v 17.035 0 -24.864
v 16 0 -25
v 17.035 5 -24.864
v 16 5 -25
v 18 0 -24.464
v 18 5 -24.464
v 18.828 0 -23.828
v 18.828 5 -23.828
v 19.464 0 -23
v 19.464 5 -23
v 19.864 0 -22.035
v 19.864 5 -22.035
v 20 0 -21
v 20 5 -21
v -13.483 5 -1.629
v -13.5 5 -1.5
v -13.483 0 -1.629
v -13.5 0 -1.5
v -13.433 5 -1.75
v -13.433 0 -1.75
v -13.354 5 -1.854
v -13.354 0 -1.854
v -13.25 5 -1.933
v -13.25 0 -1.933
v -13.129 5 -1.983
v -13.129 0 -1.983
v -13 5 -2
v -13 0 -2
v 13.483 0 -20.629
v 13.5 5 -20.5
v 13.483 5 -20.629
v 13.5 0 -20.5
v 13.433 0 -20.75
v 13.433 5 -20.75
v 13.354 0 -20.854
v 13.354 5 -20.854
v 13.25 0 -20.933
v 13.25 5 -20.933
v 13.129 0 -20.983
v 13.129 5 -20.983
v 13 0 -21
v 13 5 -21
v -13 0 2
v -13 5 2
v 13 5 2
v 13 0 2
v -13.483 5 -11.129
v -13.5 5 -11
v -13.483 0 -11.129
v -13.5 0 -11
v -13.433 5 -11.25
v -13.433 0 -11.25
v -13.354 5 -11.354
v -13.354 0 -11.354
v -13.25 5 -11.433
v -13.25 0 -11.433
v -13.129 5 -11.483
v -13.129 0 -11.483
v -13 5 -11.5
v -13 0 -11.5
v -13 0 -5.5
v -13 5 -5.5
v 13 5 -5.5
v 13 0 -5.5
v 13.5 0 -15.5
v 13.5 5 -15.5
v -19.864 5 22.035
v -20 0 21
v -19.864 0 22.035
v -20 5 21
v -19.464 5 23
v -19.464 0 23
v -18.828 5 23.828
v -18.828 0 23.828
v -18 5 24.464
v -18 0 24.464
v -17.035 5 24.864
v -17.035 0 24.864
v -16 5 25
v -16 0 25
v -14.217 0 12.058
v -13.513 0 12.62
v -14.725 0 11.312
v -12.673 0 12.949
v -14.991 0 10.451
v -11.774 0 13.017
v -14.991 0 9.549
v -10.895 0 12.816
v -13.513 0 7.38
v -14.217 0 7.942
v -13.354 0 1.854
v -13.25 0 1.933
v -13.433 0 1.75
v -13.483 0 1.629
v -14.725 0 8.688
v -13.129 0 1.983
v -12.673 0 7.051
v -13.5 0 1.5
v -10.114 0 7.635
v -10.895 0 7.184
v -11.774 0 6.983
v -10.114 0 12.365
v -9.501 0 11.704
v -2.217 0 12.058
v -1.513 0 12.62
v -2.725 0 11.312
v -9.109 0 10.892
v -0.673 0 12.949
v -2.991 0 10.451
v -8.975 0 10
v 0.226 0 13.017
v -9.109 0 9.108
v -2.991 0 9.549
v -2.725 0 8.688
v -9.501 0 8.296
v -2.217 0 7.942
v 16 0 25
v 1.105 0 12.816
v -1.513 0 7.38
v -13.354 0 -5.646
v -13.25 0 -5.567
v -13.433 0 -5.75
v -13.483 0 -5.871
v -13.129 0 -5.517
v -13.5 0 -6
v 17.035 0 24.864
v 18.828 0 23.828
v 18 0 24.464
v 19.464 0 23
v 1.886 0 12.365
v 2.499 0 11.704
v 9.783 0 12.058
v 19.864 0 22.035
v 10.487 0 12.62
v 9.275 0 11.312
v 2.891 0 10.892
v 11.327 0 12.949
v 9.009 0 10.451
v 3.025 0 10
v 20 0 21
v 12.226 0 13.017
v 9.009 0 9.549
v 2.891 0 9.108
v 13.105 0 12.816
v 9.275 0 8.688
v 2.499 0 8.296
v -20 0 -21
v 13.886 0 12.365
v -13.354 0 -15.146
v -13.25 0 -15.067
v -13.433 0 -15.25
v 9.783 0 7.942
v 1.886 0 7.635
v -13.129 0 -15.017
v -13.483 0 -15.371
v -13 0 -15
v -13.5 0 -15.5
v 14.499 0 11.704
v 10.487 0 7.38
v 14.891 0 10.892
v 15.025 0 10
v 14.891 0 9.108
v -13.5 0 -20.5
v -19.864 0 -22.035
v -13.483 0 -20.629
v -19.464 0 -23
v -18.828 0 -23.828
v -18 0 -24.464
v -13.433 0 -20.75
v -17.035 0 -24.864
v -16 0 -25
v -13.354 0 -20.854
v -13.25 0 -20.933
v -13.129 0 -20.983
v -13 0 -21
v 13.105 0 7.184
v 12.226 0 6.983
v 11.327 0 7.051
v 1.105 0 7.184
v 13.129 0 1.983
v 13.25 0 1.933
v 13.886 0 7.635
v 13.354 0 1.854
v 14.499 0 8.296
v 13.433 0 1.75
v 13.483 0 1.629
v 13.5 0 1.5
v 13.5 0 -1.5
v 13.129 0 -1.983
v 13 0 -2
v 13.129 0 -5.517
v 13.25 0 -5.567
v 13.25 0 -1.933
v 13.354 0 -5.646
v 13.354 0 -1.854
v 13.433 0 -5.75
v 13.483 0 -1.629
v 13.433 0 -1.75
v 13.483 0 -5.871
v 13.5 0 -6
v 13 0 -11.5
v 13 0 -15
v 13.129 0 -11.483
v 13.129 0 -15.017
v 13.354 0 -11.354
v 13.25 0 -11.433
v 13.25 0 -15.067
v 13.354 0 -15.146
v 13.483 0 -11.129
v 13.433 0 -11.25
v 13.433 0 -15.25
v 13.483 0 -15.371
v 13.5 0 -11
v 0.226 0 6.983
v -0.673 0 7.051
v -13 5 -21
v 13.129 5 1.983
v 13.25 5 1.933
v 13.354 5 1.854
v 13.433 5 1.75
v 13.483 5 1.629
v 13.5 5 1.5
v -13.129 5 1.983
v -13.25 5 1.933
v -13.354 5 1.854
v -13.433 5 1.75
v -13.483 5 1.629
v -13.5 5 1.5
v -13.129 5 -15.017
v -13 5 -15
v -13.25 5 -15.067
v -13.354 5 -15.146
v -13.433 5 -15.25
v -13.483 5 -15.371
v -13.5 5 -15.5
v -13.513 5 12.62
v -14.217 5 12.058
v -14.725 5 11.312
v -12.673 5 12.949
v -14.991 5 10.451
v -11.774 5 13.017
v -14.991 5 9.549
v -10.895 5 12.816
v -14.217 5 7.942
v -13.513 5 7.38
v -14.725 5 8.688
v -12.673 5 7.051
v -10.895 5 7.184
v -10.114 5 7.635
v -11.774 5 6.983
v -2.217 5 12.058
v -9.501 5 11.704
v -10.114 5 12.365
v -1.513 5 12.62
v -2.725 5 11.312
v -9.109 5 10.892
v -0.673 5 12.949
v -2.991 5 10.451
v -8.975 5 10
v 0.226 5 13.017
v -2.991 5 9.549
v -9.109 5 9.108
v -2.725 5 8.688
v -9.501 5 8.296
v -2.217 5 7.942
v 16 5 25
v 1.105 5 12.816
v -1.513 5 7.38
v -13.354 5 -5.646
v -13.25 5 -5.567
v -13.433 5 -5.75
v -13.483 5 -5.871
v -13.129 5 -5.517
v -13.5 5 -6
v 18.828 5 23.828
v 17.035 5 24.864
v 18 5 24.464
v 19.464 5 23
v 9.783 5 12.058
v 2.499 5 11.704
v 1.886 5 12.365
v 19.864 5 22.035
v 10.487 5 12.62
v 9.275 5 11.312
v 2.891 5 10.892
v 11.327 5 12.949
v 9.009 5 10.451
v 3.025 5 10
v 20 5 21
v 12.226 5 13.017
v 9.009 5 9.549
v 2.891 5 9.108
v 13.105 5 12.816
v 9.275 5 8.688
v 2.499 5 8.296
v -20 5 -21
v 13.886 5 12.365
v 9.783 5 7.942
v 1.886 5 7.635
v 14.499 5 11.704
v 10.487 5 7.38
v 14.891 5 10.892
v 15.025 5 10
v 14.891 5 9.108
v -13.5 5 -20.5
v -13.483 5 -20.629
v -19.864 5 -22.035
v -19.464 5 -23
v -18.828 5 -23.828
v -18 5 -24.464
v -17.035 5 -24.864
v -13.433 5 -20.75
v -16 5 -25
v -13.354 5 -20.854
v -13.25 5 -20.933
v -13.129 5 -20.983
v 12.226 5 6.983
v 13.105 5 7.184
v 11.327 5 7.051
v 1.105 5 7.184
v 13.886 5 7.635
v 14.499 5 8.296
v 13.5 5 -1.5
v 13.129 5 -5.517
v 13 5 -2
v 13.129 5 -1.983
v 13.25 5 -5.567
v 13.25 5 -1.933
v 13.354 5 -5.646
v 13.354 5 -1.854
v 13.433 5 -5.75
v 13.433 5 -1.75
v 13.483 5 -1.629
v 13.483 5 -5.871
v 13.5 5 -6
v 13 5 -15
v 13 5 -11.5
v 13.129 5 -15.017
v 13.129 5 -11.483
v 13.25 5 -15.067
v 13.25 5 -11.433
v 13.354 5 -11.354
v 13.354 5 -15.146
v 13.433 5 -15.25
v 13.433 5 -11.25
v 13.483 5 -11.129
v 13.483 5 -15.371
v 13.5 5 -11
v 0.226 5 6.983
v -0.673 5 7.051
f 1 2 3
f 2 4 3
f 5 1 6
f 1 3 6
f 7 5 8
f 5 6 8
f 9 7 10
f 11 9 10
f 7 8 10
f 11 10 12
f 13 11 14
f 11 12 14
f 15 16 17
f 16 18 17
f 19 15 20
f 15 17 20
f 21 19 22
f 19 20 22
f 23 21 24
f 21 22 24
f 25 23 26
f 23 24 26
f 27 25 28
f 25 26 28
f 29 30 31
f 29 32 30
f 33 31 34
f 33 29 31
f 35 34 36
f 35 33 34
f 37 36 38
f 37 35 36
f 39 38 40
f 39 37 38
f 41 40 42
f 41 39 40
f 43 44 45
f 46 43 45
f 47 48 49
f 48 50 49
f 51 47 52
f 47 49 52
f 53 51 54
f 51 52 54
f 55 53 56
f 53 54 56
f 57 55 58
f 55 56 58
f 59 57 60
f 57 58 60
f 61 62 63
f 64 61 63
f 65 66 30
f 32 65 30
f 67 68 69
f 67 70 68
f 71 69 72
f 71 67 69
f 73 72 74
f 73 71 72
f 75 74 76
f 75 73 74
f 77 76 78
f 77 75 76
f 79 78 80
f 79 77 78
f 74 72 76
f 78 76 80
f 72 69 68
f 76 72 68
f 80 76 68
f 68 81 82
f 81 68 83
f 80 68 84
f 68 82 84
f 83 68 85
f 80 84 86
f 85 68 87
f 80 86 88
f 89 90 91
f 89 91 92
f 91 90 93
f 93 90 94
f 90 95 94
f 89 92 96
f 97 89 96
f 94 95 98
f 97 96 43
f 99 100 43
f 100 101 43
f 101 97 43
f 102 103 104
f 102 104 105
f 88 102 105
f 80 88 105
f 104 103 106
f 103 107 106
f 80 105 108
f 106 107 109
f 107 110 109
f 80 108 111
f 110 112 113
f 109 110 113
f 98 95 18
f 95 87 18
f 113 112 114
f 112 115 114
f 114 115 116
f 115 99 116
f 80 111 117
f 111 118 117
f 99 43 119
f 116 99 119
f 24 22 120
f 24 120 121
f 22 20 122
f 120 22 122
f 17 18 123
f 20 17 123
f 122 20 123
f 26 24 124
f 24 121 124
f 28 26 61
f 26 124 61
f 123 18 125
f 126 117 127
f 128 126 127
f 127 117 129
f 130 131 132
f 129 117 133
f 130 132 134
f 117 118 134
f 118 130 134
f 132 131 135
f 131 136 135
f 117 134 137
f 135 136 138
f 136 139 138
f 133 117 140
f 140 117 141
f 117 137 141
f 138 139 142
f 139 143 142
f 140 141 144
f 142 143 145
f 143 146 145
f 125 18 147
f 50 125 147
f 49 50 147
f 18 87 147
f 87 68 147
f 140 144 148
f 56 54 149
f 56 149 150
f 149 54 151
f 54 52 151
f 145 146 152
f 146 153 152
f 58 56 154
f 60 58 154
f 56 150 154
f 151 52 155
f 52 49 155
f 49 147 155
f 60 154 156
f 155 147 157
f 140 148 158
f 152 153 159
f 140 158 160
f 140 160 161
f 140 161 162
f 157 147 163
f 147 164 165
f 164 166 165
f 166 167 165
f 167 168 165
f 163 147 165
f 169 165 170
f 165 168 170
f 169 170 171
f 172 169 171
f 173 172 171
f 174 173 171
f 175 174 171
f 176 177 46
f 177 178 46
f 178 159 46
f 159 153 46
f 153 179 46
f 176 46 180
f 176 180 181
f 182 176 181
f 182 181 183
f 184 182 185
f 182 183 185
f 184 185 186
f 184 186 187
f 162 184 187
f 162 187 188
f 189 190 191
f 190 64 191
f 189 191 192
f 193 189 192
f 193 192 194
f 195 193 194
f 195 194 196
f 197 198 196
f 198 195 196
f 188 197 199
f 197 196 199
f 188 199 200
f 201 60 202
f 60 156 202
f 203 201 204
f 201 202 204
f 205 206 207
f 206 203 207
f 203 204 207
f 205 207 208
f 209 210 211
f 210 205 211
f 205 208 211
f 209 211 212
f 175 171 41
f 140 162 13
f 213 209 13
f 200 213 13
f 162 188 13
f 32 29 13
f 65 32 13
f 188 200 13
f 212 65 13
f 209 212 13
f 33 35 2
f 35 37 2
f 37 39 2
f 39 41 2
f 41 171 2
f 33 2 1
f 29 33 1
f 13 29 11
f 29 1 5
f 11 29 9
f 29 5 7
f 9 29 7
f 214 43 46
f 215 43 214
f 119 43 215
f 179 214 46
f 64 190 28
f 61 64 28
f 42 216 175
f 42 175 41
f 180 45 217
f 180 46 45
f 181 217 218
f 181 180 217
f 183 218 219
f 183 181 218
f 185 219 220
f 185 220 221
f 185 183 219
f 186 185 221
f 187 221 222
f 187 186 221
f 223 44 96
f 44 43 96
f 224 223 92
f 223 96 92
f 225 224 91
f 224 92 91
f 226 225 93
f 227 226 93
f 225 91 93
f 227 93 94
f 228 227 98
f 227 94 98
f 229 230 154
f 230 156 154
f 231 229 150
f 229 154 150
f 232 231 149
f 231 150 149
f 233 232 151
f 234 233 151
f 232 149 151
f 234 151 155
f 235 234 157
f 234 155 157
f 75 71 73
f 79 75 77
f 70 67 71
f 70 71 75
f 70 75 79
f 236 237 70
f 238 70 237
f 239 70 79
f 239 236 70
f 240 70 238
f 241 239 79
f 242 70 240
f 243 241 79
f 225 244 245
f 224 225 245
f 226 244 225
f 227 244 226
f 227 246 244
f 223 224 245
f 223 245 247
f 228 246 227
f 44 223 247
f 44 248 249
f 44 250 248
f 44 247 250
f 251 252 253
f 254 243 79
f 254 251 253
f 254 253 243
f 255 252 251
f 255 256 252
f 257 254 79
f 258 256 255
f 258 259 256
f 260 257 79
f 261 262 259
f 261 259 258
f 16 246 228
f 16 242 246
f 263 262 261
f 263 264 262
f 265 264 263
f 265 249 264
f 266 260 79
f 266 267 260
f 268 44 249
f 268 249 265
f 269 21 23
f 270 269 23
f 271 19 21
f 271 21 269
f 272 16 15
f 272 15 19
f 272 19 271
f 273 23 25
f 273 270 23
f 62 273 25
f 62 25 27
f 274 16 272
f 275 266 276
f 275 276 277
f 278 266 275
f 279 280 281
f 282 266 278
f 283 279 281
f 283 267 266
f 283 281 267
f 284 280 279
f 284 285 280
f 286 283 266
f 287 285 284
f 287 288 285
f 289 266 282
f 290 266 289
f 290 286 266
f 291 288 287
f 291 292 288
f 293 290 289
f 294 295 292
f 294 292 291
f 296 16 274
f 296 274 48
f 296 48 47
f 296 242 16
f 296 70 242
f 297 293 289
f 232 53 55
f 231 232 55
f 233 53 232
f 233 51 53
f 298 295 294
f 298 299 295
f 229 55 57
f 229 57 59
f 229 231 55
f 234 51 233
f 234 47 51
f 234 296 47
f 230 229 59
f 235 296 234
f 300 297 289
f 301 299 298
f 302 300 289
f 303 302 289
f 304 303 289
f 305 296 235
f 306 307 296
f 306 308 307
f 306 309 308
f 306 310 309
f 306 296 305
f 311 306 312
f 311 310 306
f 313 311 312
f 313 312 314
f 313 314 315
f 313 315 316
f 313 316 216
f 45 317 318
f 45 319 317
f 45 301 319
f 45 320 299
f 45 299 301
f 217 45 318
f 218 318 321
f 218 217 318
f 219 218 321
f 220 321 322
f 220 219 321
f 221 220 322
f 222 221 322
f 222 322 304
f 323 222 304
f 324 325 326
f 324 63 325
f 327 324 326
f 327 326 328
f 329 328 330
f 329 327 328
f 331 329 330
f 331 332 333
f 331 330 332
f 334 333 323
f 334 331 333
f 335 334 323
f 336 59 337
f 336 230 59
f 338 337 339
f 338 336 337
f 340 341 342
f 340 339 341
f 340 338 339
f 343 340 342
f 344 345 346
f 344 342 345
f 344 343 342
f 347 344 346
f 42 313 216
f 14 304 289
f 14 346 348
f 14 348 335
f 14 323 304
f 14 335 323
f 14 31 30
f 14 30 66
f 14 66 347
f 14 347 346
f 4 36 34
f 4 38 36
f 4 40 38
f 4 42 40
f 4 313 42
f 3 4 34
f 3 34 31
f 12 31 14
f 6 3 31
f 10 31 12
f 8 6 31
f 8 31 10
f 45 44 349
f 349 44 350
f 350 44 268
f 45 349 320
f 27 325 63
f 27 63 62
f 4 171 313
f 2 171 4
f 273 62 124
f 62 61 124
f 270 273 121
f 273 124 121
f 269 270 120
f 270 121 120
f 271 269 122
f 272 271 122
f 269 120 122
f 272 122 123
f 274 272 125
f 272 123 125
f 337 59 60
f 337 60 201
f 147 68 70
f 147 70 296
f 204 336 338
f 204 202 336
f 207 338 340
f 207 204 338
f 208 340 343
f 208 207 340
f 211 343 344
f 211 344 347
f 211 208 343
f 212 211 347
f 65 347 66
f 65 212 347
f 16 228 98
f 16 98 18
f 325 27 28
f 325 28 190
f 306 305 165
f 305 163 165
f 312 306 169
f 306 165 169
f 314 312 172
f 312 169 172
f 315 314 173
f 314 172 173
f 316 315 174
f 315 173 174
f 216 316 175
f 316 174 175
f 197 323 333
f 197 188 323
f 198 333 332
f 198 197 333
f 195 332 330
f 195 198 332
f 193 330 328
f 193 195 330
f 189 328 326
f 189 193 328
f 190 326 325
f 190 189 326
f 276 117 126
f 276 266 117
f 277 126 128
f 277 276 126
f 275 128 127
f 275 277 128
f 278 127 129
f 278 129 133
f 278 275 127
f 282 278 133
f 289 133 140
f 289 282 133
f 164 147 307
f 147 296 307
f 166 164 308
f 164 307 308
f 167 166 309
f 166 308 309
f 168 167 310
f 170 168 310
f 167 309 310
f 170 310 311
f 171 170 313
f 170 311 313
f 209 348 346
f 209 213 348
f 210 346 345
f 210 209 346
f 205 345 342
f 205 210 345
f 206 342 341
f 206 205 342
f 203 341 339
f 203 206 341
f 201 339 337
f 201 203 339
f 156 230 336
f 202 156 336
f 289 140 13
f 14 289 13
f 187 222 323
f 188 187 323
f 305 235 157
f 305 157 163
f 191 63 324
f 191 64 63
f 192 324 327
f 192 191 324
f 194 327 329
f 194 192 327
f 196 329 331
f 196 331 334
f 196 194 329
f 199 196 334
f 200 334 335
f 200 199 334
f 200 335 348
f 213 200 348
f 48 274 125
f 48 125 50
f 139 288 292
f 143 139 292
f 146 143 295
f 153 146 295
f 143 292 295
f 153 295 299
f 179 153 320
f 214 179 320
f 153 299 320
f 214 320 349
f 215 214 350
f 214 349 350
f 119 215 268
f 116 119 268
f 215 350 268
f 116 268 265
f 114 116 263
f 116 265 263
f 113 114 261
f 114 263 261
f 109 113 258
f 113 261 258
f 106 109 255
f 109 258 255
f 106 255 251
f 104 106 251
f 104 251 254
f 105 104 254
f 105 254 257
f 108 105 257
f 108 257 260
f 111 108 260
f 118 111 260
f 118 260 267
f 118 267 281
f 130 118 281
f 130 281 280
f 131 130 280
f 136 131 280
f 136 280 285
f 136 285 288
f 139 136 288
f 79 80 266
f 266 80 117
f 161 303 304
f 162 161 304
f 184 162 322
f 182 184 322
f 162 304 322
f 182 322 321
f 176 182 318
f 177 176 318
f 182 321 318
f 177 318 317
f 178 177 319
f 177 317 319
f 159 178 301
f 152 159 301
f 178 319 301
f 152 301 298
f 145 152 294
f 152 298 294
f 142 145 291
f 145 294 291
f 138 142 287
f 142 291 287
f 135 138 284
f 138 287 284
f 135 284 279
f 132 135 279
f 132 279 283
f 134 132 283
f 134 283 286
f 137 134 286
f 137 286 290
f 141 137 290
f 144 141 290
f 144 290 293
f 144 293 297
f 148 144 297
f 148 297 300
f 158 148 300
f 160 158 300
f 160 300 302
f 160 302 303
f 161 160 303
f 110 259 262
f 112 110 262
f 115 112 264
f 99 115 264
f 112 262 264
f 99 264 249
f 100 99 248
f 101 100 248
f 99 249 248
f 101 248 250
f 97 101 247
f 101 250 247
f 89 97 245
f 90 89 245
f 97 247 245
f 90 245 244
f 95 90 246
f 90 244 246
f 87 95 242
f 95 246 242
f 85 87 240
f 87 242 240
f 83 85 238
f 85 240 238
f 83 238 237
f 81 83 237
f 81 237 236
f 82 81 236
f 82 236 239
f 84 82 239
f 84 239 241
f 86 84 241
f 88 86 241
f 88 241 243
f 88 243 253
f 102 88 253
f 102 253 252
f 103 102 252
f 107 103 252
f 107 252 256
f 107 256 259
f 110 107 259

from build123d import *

# Parameters (mm, degrees)
SKETCH1_W           = 40
SKETCH1_H           = 50
BOSS_EXTRUDE1_DEPTH = 5
SKETCH2_W           = 27
SKETCH2_H           = 6
SKETCH2_H_2         = 4
CUT_EXTRUDE1_DEPTH  = 6
SKETCH3_R           = 3.025
CUT_EXTRUDE2_DEPTH  = 6
LPATTERN1_COUNT     = 2
LPATTERN1_PITCH     = 12
LPATTERN1_COL_COUNT = 2
LPATTERN1_COL_PITCH = 12
FILLET1_R           = 4
FILLET2_R           = 0.5


with BuildPart() as part:
    # Sketch1 → Boss-Extrude1 (new body)
    with BuildSketch(Plane(origin=(0, 0, 0), x_dir=(1, 0, 0), z_dir=(0, 1, 0))):
        Rectangle(SKETCH1_W, SKETCH1_H)
    extrude(amount=BOSS_EXTRUDE1_DEPTH)

    # Sketch2 → Cut-Extrude1 (cut, through all)
    with BuildSketch(Plane(origin=(0, 5, 0), x_dir=(1, 0, 0), z_dir=(0, 1, 0))):
        with Locations((0, 18)):
            Rectangle(SKETCH2_W, SKETCH2_H)
        with Locations((0, 8.5)):
            Rectangle(SKETCH2_W, SKETCH2_H)
        Rectangle(SKETCH2_W, SKETCH2_H_2)
    extrude(amount=-CUT_EXTRUDE1_DEPTH, mode=Mode.SUBTRACT)

    # Sketch3 → Cut-Extrude2 (cut, through all)
    with BuildSketch(Plane(origin=(0, 5, 0), x_dir=(1, 0, 0), z_dir=(0, 1, 0))):
        with Locations((0, -10)):
            Circle(SKETCH3_R)
    cut_extrude2 = extrude(amount=-CUT_EXTRUDE2_DEPTH, mode=Mode.SUBTRACT)

    # LPattern1: Cut-Extrude2 ×2
    with Locations(*[(i * LPATTERN1_PITCH, 0, 0) for i in range(1, LPATTERN1_COUNT)]):
        add(cut_extrude2, mode=Mode.SUBTRACT)

    # LPattern1 col: Cut-Extrude2 ×2
    with Locations(*[(-i * LPATTERN1_COL_PITCH, 0, 0) for i in range(1, LPATTERN1_COL_COUNT)]):
        add(cut_extrude2, mode=Mode.SUBTRACT)

    # Fillet1
    fillet1_edges = [part.edges().sort_by_distance(p)[0] for p in [
        (20, 2.5, 25),
        (-20, 2.5, 25),
        (-20, 2.5, -25),
        (20, 2.5, -25),
    ]]
    fillet(fillet1_edges, radius=FILLET1_R)

    # Fillet2
    fillet2_edges = [part.edges().sort_by_distance(p)[0] for p in [
        (13.5, 2.5, -21),
        (13.5, 2.5, -15),
        (-13.5, 2.5, -15),
        (-13.5, 2.5, -21),
        (13.5, 2.5, -11.5),
        (13.5, 2.5, -5.5),
        (-13.5, 2.5, -5.5),
        (-13.5, 2.5, -11.5),
        (13.5, 2.5, -2),
        (13.5, 2.5, 2),
        (-13.5, 2.5, 2),
        (-13.5, 2.5, -2),
    ]]
    fillet(fillet2_edges, radius=FILLET2_R)


solid = part.part
